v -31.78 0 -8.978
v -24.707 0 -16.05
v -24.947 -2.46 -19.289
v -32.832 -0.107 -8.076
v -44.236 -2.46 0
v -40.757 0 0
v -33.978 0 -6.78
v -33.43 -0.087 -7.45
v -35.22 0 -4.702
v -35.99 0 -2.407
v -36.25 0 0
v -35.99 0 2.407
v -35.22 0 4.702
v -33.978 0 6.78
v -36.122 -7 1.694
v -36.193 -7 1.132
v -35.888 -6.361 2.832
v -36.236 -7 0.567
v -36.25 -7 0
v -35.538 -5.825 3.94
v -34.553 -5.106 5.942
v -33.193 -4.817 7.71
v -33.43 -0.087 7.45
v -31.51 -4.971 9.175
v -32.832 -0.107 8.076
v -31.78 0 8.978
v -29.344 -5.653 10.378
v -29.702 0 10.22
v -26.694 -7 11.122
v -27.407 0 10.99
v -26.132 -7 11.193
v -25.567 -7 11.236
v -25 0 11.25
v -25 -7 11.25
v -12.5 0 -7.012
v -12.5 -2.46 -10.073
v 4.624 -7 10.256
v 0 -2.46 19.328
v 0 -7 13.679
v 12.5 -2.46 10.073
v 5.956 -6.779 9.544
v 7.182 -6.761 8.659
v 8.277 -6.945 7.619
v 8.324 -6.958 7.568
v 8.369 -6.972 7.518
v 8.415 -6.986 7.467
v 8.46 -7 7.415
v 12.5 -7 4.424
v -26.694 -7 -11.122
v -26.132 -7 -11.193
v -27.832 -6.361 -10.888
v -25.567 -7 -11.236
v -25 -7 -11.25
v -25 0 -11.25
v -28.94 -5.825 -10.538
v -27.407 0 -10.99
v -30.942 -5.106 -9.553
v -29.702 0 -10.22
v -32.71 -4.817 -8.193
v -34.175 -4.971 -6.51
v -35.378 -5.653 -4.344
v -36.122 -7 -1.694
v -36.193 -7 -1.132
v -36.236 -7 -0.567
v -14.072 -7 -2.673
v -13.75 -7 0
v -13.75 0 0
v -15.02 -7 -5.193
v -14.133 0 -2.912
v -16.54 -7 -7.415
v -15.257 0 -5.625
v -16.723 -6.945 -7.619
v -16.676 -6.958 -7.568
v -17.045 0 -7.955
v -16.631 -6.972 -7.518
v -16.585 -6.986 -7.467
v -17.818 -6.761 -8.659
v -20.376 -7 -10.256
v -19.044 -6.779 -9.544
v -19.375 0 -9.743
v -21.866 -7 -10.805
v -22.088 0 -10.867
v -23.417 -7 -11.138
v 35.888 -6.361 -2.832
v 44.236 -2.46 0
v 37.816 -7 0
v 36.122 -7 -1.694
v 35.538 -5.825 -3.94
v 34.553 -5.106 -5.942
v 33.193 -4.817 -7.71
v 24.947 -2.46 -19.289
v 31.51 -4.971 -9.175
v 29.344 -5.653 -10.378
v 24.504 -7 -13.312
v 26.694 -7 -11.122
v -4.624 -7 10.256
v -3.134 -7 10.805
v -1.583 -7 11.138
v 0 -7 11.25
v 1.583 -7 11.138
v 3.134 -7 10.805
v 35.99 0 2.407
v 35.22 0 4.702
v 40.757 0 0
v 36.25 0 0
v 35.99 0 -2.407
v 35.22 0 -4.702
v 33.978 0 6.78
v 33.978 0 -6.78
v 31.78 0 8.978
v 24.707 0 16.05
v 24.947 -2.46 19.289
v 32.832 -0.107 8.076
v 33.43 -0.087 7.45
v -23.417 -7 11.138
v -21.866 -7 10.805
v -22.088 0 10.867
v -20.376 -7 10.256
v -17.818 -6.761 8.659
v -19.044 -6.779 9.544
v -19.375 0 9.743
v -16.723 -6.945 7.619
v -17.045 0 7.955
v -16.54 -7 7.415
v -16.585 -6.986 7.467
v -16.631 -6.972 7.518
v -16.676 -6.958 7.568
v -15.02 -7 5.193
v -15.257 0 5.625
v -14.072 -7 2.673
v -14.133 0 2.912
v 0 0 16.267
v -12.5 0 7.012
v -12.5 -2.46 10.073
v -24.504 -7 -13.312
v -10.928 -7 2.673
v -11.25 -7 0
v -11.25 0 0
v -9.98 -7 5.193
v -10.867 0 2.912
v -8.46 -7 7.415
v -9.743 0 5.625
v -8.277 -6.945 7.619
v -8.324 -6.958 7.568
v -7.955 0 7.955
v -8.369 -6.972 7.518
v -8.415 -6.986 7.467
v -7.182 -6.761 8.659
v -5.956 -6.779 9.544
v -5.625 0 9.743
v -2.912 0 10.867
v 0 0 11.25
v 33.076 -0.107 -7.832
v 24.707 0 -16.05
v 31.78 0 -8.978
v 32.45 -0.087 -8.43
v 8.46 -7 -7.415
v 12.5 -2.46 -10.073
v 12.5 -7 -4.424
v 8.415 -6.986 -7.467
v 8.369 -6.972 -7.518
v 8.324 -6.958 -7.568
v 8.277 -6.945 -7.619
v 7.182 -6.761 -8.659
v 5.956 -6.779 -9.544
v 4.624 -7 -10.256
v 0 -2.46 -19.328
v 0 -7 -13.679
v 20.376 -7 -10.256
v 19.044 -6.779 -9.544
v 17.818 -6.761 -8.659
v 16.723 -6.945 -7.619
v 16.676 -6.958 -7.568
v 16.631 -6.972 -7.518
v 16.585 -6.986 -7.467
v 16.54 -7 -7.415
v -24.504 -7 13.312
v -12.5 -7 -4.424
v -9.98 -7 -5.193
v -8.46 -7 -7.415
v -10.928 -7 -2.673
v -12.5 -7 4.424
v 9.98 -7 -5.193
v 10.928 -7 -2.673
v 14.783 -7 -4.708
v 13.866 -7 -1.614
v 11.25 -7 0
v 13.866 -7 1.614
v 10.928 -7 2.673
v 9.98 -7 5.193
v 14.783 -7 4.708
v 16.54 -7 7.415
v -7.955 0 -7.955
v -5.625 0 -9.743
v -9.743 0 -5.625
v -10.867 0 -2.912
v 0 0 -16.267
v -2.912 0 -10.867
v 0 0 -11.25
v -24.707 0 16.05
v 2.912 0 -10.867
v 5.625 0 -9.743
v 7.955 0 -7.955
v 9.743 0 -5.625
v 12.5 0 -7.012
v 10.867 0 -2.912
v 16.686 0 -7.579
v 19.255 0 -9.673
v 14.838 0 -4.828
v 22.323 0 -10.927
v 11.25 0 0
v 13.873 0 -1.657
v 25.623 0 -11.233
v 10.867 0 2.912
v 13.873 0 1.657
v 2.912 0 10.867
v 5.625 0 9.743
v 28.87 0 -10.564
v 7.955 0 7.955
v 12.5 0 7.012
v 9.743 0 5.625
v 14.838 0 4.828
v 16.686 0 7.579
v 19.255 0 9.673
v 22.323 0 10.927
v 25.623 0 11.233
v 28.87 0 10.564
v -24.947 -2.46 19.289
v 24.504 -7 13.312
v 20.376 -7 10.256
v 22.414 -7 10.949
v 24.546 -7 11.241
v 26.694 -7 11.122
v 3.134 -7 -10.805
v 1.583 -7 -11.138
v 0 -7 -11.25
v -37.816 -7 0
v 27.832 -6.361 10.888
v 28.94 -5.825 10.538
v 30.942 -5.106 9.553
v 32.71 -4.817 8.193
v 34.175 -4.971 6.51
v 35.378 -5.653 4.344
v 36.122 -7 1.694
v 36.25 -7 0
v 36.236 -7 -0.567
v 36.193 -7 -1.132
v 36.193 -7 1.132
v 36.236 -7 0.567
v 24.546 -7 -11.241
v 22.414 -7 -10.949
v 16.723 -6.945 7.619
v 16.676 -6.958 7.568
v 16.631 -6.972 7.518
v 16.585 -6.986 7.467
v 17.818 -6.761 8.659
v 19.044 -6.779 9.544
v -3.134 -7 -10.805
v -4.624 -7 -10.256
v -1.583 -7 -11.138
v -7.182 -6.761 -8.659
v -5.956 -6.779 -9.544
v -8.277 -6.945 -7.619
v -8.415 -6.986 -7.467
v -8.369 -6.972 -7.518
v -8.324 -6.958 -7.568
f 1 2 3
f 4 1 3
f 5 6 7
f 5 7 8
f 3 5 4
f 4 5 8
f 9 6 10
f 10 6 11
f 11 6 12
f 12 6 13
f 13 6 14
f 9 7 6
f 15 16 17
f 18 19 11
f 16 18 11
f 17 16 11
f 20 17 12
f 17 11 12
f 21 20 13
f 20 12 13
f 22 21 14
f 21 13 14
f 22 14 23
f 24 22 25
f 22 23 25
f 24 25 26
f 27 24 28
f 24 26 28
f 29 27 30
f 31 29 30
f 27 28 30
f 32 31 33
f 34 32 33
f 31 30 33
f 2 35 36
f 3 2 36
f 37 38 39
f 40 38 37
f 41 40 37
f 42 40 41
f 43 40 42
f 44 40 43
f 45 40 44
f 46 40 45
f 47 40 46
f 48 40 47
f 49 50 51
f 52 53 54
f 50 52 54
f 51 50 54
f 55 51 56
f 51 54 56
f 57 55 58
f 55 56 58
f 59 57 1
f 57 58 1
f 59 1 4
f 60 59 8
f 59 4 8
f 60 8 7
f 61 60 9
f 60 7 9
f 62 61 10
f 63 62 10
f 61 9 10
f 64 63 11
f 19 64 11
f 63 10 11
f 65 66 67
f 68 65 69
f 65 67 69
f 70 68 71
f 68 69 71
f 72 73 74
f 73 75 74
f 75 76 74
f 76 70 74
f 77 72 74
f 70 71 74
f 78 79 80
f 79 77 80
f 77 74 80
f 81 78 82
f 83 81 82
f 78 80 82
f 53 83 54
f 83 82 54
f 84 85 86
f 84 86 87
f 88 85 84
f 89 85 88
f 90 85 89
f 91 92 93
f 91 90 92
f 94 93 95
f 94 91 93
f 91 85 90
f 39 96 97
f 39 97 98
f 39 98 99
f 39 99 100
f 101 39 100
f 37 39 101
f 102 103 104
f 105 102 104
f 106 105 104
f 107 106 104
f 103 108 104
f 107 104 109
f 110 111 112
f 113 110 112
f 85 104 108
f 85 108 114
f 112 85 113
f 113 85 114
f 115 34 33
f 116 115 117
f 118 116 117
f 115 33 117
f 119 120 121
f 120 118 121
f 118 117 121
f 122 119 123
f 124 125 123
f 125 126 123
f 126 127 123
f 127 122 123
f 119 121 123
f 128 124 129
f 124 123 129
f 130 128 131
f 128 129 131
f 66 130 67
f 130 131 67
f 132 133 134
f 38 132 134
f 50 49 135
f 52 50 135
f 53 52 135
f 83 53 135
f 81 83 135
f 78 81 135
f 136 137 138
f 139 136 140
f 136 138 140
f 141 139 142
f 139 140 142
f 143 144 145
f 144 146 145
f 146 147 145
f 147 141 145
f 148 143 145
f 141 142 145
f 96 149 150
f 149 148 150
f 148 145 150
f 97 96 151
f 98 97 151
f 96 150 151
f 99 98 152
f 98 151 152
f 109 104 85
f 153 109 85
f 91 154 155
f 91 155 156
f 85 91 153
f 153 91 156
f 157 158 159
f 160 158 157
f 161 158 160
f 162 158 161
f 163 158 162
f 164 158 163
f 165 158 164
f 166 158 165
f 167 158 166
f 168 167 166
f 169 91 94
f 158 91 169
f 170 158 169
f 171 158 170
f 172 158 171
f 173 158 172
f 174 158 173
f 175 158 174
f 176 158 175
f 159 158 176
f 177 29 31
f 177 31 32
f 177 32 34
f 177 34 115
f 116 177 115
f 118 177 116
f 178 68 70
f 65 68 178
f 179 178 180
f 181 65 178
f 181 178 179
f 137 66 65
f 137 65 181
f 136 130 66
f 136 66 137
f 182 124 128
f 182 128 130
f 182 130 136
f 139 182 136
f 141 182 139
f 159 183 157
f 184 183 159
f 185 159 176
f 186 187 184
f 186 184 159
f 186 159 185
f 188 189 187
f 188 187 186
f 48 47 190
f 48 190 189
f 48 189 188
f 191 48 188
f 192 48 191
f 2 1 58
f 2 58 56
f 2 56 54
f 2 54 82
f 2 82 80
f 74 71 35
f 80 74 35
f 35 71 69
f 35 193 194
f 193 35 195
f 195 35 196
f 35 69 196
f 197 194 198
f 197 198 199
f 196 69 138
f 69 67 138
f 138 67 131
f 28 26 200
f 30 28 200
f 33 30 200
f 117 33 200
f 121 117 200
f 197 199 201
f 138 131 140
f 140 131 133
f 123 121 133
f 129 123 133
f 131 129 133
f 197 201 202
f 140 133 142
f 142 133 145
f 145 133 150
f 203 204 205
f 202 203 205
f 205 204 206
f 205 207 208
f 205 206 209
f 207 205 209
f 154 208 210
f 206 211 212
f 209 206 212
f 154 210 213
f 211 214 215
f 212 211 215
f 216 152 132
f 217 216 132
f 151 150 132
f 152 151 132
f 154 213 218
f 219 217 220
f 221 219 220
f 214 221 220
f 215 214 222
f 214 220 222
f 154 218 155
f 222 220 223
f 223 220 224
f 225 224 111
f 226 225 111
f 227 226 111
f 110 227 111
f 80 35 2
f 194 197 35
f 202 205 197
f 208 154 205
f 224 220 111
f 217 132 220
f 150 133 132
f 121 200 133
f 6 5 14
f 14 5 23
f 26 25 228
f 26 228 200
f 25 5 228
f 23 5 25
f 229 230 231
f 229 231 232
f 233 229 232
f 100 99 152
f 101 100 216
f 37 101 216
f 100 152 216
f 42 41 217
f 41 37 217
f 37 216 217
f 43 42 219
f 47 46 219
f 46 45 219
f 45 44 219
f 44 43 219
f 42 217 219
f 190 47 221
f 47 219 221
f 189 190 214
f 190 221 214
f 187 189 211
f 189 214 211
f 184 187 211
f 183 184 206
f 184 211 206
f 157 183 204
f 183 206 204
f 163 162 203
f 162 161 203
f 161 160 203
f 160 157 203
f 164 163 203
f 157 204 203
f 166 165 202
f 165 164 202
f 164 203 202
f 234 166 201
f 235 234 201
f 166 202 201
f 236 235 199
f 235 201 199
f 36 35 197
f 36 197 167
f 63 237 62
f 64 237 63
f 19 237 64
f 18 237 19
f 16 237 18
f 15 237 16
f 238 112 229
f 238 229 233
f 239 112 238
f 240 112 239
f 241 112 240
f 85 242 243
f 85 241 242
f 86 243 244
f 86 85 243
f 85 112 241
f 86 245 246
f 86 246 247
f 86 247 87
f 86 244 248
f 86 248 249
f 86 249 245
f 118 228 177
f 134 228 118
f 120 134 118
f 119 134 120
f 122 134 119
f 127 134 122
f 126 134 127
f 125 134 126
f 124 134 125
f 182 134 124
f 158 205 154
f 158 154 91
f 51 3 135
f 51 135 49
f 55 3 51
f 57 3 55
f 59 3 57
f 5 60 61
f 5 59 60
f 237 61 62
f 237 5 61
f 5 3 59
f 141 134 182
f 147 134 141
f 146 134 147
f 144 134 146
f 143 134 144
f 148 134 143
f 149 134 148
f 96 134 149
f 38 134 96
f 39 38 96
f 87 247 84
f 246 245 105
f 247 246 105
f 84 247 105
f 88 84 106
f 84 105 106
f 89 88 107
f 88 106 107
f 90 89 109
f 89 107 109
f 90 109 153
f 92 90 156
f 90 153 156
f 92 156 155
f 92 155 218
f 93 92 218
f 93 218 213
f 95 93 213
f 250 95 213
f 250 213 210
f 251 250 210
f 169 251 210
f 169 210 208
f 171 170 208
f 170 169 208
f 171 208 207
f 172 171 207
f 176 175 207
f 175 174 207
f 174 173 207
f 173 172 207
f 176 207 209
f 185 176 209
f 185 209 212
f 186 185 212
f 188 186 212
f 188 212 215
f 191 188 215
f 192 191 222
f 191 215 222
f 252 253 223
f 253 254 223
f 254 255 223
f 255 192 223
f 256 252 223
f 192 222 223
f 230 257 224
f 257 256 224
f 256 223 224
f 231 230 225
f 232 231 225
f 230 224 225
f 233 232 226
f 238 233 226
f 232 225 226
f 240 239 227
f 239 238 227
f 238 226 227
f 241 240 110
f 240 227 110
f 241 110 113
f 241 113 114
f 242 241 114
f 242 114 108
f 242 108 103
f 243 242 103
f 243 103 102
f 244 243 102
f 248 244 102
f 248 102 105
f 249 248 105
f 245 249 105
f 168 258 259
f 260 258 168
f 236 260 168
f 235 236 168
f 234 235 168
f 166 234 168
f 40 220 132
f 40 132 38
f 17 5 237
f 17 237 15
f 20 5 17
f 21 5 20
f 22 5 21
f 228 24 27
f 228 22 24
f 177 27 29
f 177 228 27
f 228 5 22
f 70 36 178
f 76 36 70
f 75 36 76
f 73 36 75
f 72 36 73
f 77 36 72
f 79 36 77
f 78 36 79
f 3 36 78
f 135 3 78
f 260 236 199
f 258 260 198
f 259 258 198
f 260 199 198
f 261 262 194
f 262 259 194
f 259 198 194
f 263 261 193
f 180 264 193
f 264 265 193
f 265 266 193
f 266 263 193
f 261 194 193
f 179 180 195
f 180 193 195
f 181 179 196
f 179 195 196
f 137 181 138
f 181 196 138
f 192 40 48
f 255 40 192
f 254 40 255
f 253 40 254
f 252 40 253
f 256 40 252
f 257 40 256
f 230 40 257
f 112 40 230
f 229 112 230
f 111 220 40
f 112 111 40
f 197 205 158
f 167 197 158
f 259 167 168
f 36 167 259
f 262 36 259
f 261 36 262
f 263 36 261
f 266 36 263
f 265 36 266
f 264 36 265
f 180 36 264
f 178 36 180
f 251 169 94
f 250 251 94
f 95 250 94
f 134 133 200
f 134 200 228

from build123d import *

# Parameters (mm, degrees)
F1_DEPTH      = 7
F2_T1_DEPTH   = 54.4125704052
F2_T3_DEPTH   = 54.4125704052
F2_T5_DEPTH   = 54.4125704052
F2_T7_DEPTH   = 54.4125704052
F2_T12_DEPTH  = 41.6814695772
F2_T17_DEPTH  = 41.6814695772
F2_T22_DEPTH  = 41.6814695772
F2_T27_DEPTH  = 41.6814695772
F2_T32_DEPTH  = 41.6814695772
F2_T37_DEPTH  = 41.6814695772
F2_T42_DEPTH  = 41.6814695772
F2_T47_DEPTH  = 41.6814695772
F2_T53_DEPTH  = 41.6814695772
F2_S55_R      = 11.25
F2_T56_DEPTH  = 25
F2_T59_DEPTH  = 41.6814695772
F2_S61_R      = 11.25
F2_T62_DEPTH  = 25
F2_T68_DEPTH  = 41.6814695772
F2_S70_R      = 11.25
F2_T71_DEPTH  = 25
F2_T74_DEPTH  = 41.6814695772
F2_S76_R      = 11.25
F2_T77_DEPTH  = 25
F2_T83_DEPTH  = 41.6814695772
F2_S85_R      = 11.25
F2_T86_DEPTH  = 25
F2_T89_DEPTH  = 41.6814695772
F2_S91_R      = 11.25
F2_T92_DEPTH  = 25
F2_T98_DEPTH  = 41.6814695772
F2_S100_R     = 11.25
F2_T101_DEPTH = 25
F2_T104_DEPTH = 41.6814695772
F2_S106_R     = 11.25
F2_T107_DEPTH = 25
F3_T1_DEPTH   = 43.7143691753
F3_T3_DEPTH   = 43.7143691753
F3_T5_DEPTH   = 43.7143691753
F3_T7_DEPTH   = 43.7143691753
F3_T12_DEPTH  = 30.9832683473
F3_T17_DEPTH  = 30.9832683473
F3_T22_DEPTH  = 30.9832683473
F3_T27_DEPTH  = 30.9832683473
F3_T32_DEPTH  = 30.9832683473
F3_T37_DEPTH  = 30.9832683473
F3_T42_DEPTH  = 30.9832683473
F3_T47_DEPTH  = 30.9832683473
F3_T53_DEPTH  = 30.9832683473
F3_T57_DEPTH  = 30.9832683473
F3_T64_DEPTH  = 30.9832683473
F3_T68_DEPTH  = 30.9832683473
F3_T75_DEPTH  = 30.9832683473
F3_T79_DEPTH  = 30.9832683473
F3_T86_DEPTH  = 30.9832683473
F3_T90_DEPTH  = 30.9832683473


# Not quite as in the source:
# - a fillet or chamfer that OpenCascade refuses, or shapes differently, is made with other operations: its cross-section is extruded or revolved along the edge and cut away or added


with BuildPart() as f1:
    # F0 (on Front) → F1 (new body)
    with BuildSketch(Plane.XZ):
        with BuildLine():
            Line((-25, 11.25), (-25, 20))
            Line((-25, 20), (-45, 0))
            Line((-45, 0), (-36.25, 0))
            ThreePointArc((-36.25, 0), (-32.9549512883, 7.9549512883), (-25, 11.25))
        make_face()
        with BuildLine():
            Line((-13.75, 0), (-12.5, 0))
            Line((-12.5, 0), (-12.5, 10.7452115044))
            Line((-12.5, 10.7452115044), (-25, 20))
            Line((-25, 20), (-25, 11.25))
            ThreePointArc((-25, 11.25), (-17.0450487117, 7.9549512883), (-13.75, 0))
        make_face()
        with BuildLine():
            Line((-12.5, -10.7452115044), (-12.5, 0))
            Line((-12.5, 0), (-13.75, 0))
            ThreePointArc((-13.75, 0), (-17.0450487117, -7.9549512883), (-25, -11.25))
            Line((-25, -11.25), (-25, -20))
            Line((-25, -20), (-12.5, -10.7452115044))
        make_face()
        with BuildLine():
            Line((-45, 0), (-25, -20))
            Line((-25, -20), (-25, -11.25))
            ThreePointArc((-25, -11.25), (-32.9549512883, -7.9549512883), (-36.25, 0))
            Line((-36.25, 0), (-45, 0))
        make_face()
        with BuildLine():
            Line((0, -20), (0, -11.25))
            ThreePointArc((0, -11.25), (-7.9549512883, -7.9549512883), (-11.25, 0))
            Line((-11.25, 0), (-12.5, 0))
            Line((-12.5, 0), (-12.5, -10.7452115044))
            Line((-12.5, -10.7452115044), (0, -20))
        make_face()
        with BuildLine():
            Line((12.5, 0), (11.25, 0))
            ThreePointArc((11.25, 0), (7.9549512883, -7.9549512883), (0, -11.25))
            Line((0, -11.25), (0, -20))
            Line((0, -20), (12.5, -10.7452115044))
            Line((12.5, -10.7452115044), (12.5, 0))
        make_face()
        with BuildLine():
            ThreePointArc((0, 11.25), (7.9549512883, 7.9549512883), (11.25, 0))
            Line((11.25, 0), (12.5, 0))
            Line((12.5, 0), (12.5, 10.7452115044))
            Line((12.5, 10.7452115044), (0, 20))
            Line((0, 20), (0, 11.25))
        make_face()
        with BuildLine():
            ThreePointArc((-11.25, 0), (-7.9549512883, 7.9549512883), (0, 11.25))
            Line((0, 11.25), (0, 20))
            Line((0, 20), (-12.5, 10.7452115044))
            Line((-12.5, 10.7452115044), (-12.5, 0))
            Line((-12.5, 0), (-11.25, 0))
        make_face()
        with BuildLine():
            Line((12.5, 10.7452115044), (12.5, 0))
            Line((12.5, 0), (13.75, 0))
            ThreePointArc((13.75, 0), (25, 11.25), (36.25, 0))
            Line((36.25, 0), (45, 0))
            Line((45, 0), (25, 20))
            Line((25, 20), (12.5, 10.7452115044))
        make_face()
        with BuildLine():
            Line((13.75, 0), (12.5, 0))
            Line((12.5, 0), (12.5, -10.7452115044))
            Line((12.5, -10.7452115044), (25, -20))
            Line((25, -20), (45, 0))
            Line((45, 0), (36.25, 0))
            ThreePointArc((36.25, 0), (25, -11.25), (13.75, 0))
        make_face()
    extrude(amount=F1_DEPTH)

    # F2: chamfer of 5.08 on 12 edges, made by hand

    # F2_s2 → F2_t1 (cut)
    with BuildSketch(Plane(origin=(6.7377487577, 0, 6.7377487577), x_dir=(0, 1, 0), z_dir=(-0.7071067812, 0, -0.7071067812))):
        Polygon((-1.92, -31.8198051534), (-7, -26.7398051534), (-7, -31.8198051534), align=None)
    extrude(amount=F2_T1_DEPTH, mode=Mode.SUBTRACT)

    # F2_s4 → F2_t3 (cut)
    with BuildSketch(Plane(origin=(31.7377487577, 0, -31.7377487577), x_dir=(0, 1, 0), z_dir=(-0.7071067812, 0, 0.7071067812))):
        Polygon((-1.92, -31.8198051534), (-7, -26.7398051534), (-7, -31.8198051534), align=None)
    extrude(amount=F2_T3_DEPTH, mode=Mode.SUBTRACT)

    # F2_s6 → F2_t5 (cut)
    with BuildSketch(Plane(origin=(-6.7377487577, 0, -6.7377487577), x_dir=(0, 1, 0), z_dir=(0.7071067812, 0, 0.7071067812))):
        Polygon((-1.92, -31.8198051534), (-7, -26.7398051534), (-7, -31.8198051534), align=None)
    extrude(amount=F2_T5_DEPTH, mode=Mode.SUBTRACT)

    # F2_s8 → F2_t7 (cut)
    with BuildSketch(Plane(origin=(-31.7377487577, 0, 31.7377487577), x_dir=(0, 1, 0), z_dir=(0.7071067812, 0, -0.7071067812))):
        Polygon((-1.92, -31.8198051534), (-7, -26.7398051534), (-7, -31.8198051534), align=None)
    extrude(amount=F2_T7_DEPTH, mode=Mode.SUBTRACT)


with BuildPart() as f2_tool10:
    # F2_s11 → F2_t12 (new body)
    with BuildSketch(Plane(origin=(-2.7131807604, 0, 2.008793127), x_dir=(0, 1, 0), z_dir=(-0.8036946592, 0, 0.5950419269))):
        Polygon((-1.92, -1.1978450121), (-7, 3.8821549879), (-7, -1.1978450121), align=None)
    extrude(amount=F2_T12_DEPTH)

    split(bisect_by=Plane(origin=(-9.5646403729, 0, 12.918502105), x_dir=(0, 1, 0), z_dir=(-0.5950419269, 0, 0.8036946592)), keep=Keep.TOP)


with BuildPart() as f1_1:
    add(f1.part)

    # F2_t9: cut F2_tool10
    add(f2_tool10.part, mode=Mode.SUBTRACT)


with BuildPart() as f2_tool15:
    # F2_s16 → F2_t17 (new body)
    with BuildSketch(Plane(origin=(20.0642276166, 0, 14.8552146336), x_dir=(0, 1, 0), z_dir=(-0.8036946592, 0, -0.5950419269))):
        Polygon((-1.92, -16.0738931843), (-7, -10.9938931843), (-7, -16.0738931843), align=None)
    extrude(amount=F2_T17_DEPTH)

    split(bisect_by=Plane(origin=(0.7127680041, 0, 0.9627016388), x_dir=(0, 1, 0), z_dir=(0.5950419269, 0, 0.8036946592)), keep=Keep.TOP)


with BuildPart() as f1_2:
    add(f1_1.part)

    # F2_t14: cut F2_tool15
    add(f2_tool15.part, mode=Mode.SUBTRACT)


with BuildPart() as f2_tool20:
    # F2_s21 → F2_t22 (new body)
    with BuildSketch(Plane(origin=(13.4349468708, 0, -9.9470073391), x_dir=(0, 1, 0), z_dir=(-0.8036946592, 0, 0.5950419269))):
        Polygon((-1.92, -16.0738931843), (-7, -10.9938931843), (-7, -16.0738931843), align=None)
    extrude(amount=F2_T22_DEPTH)

    split(bisect_by=Plane(origin=(-0.7127680041, 0, 0.9627016388), x_dir=(0, 1, 0), z_dir=(-0.5950419269, 0, 0.8036946592)), keep=Keep.TOP)


with BuildPart() as f1_3:
    add(f1_2.part)

    # F2_t19: cut F2_tool20
    add(f2_tool20.part, mode=Mode.SUBTRACT)


with BuildPart() as f2_tool25:
    # F2_s26 → F2_t27 (new body)
    with BuildSketch(Plane(origin=(36.2123552478, 0, 26.8110150997), x_dir=(0, 1, 0), z_dir=(-0.8036946592, 0, -0.5950419269))):
        Polygon((-1.92, -1.1978450121), (-7, 3.8821549879), (-7, -1.1978450121), align=None)
    extrude(amount=F2_T27_DEPTH)

    split(bisect_by=Plane(origin=(9.5646403729, 0, 12.918502105), x_dir=(0, 1, 0), z_dir=(0.5950419269, 0, 0.8036946592)), keep=Keep.TOP)


with BuildPart() as f1_4:
    add(f1_3.part)

    # F2_t24: cut F2_tool25
    add(f2_tool25.part, mode=Mode.SUBTRACT)


with BuildPart() as f2_tool30:
    # F2_s31 → F2_t32 (new body)
    with BuildSketch(Plane(origin=(2.7131807604, 0, -2.008793127), x_dir=(0, 1, 0), z_dir=(0.8036946592, 0, -0.5950419269))):
        Polygon((-1.92, -1.1978450121), (-7, 3.8821549879), (-7, -1.1978450121), align=None)
    extrude(amount=F2_T32_DEPTH)

    split(bisect_by=Plane(origin=(9.5646403729, 0, -12.918502105), x_dir=(0, 1, 0), z_dir=(0.5950419269, 0, -0.8036946592)), keep=Keep.TOP)


with BuildPart() as f1_5:
    add(f1_4.part)

    # F2_t29: cut F2_tool30
    add(f2_tool30.part, mode=Mode.SUBTRACT)


with BuildPart() as f2_tool35:
    # F2_s36 → F2_t37 (new body)
    with BuildSketch(Plane(origin=(-20.0642276166, 0, -14.8552146336), x_dir=(0, 1, 0), z_dir=(0.8036946592, 0, 0.5950419269))):
        Polygon((-1.92, -16.0738931843), (-7, -10.9938931843), (-7, -16.0738931843), align=None)
    extrude(amount=F2_T37_DEPTH)

    split(bisect_by=Plane(origin=(-0.7127680041, 0, -0.9627016388), x_dir=(0, 1, 0), z_dir=(-0.5950419269, 0, -0.8036946592)), keep=Keep.TOP)


with BuildPart() as f1_6:
    add(f1_5.part)

    # F2_t34: cut F2_tool35
    add(f2_tool35.part, mode=Mode.SUBTRACT)


with BuildPart() as f2_tool40:
    # F2_s41 → F2_t42 (new body)
    with BuildSketch(Plane(origin=(-13.4349468708, 0, 9.9470073391), x_dir=(0, 1, 0), z_dir=(0.8036946592, 0, -0.5950419269))):
        Polygon((-1.92, -16.0738931843), (-7, -10.9938931843), (-7, -16.0738931843), align=None)
    extrude(amount=F2_T42_DEPTH)

    split(bisect_by=Plane(origin=(0.7127680041, 0, -0.9627016388), x_dir=(0, 1, 0), z_dir=(0.5950419269, 0, -0.8036946592)), keep=Keep.TOP)


with BuildPart() as f1_7:
    add(f1_6.part)

    # F2_t39: cut F2_tool40
    add(f2_tool40.part, mode=Mode.SUBTRACT)


with BuildPart() as f2_tool45:
    # F2_s46 → F2_t47 (new body)
    with BuildSketch(Plane(origin=(-36.2123552478, 0, -26.8110150997), x_dir=(0, 1, 0), z_dir=(0.8036946592, 0, 0.5950419269))):
        Polygon((-1.92, -1.1978450121), (-7, 3.8821549879), (-7, -1.1978450121), align=None)
    extrude(amount=F2_T47_DEPTH)

    split(bisect_by=Plane(origin=(-9.5646403729, 0, -12.918502105), x_dir=(0, 1, 0), z_dir=(-0.5950419269, 0, -0.8036946592)), keep=Keep.TOP)


with BuildPart() as f1_8:
    add(f1_7.part)

    # F2_t44: cut F2_tool45
    add(f2_tool45.part, mode=Mode.SUBTRACT)


with BuildPart() as f2_tool51:
    # F2_s52 → F2_t53 (new body)
    with BuildSketch(Plane(origin=(20.0642276166, 0, 14.8552146336), x_dir=(0, 1, 0), z_dir=(-0.8036946592, 0, -0.5950419269))):
        Polygon((-1.92, -16.0738931843), (-7, -10.9938931843), (-7, -16.0738931843), align=None)
    extrude(amount=F2_T53_DEPTH)

    split(bisect_by=Plane(origin=(0.7127680041, 0, 0.9627016388), x_dir=(0, 1, 0), z_dir=(-0.5950419269, 0, -0.8036946592)), keep=Keep.TOP)

    # F2_s55 → F2_t56 (cut, symmetric)
    with BuildSketch(Plane.XZ.offset(4.5)):
        with Locations((-25, 0)):
            Circle(F2_S55_R)
    extrude(amount=F2_T56_DEPTH, both=True, mode=Mode.SUBTRACT)


with BuildPart() as f2_tool57:
    # F2_s58 → F2_t59 (new body)
    with BuildSketch(Plane(origin=(-2.7131807604, 0, 2.008793127), x_dir=(0, 1, 0), z_dir=(-0.8036946592, 0, 0.5950419269))):
        Polygon((-1.92, -1.1978450121), (-7, 3.8821549879), (-7, -1.1978450121), align=None)
    extrude(amount=F2_T59_DEPTH)

    split(bisect_by=Plane(origin=(-9.5646403729, 0, 12.918502105), x_dir=(0, 1, 0), z_dir=(0.5950419269, 0, -0.8036946592)), keep=Keep.TOP)

    # F2_s61 → F2_t62 (cut, symmetric)
    with BuildSketch(Plane.XZ.offset(4.5)):
        Circle(F2_S61_R)
    extrude(amount=F2_T62_DEPTH, both=True, mode=Mode.SUBTRACT)


with BuildPart() as f2_tool51_1:
    add(f2_tool51.part)

    # F2_t63: intersect F2_tool57
    add(f2_tool57.part, mode=Mode.INTERSECT)


with BuildPart() as f1_9:
    add(f1_8.part)

    # F2_t49: cut F2_tool51
    add(f2_tool51_1.part, mode=Mode.SUBTRACT)


with BuildPart() as f2_tool66:
    # F2_s67 → F2_t68 (new body)
    with BuildSketch(Plane(origin=(36.2123552478, 0, 26.8110150997), x_dir=(0, 1, 0), z_dir=(-0.8036946592, 0, -0.5950419269))):
        Polygon((-1.92, -1.1978450121), (-7, 3.8821549879), (-7, -1.1978450121), align=None)
    extrude(amount=F2_T68_DEPTH)

    split(bisect_by=Plane(origin=(9.5646403729, 0, 12.918502105), x_dir=(0, 1, 0), z_dir=(-0.5950419269, 0, -0.8036946592)), keep=Keep.TOP)

    # F2_s70 → F2_t71 (cut, symmetric)
    with BuildSketch(Plane.XZ.offset(4.5)):
        Circle(F2_S70_R)
    extrude(amount=F2_T71_DEPTH, both=True, mode=Mode.SUBTRACT)


with BuildPart() as f2_tool72:
    # F2_s73 → F2_t74 (new body)
    with BuildSketch(Plane(origin=(13.4349468708, 0, -9.9470073391), x_dir=(0, 1, 0), z_dir=(-0.8036946592, 0, 0.5950419269))):
        Polygon((-1.92, -16.0738931843), (-7, -10.9938931843), (-7, -16.0738931843), align=None)
    extrude(amount=F2_T74_DEPTH)

    split(bisect_by=Plane(origin=(-0.7127680041, 0, 0.9627016388), x_dir=(0, 1, 0), z_dir=(0.5950419269, 0, -0.8036946592)), keep=Keep.TOP)

    # F2_s76 → F2_t77 (cut, symmetric)
    with BuildSketch(Plane.XZ.offset(4.5)):
        with Locations((25, 0)):
            Circle(F2_S76_R)
    extrude(amount=F2_T77_DEPTH, both=True, mode=Mode.SUBTRACT)


with BuildPart() as f2_tool66_1:
    add(f2_tool66.part)

    # F2_t78: intersect F2_tool72
    add(f2_tool72.part, mode=Mode.INTERSECT)


with BuildPart() as f1_10:
    add(f1_9.part)

    # F2_t64: cut F2_tool66
    add(f2_tool66_1.part, mode=Mode.SUBTRACT)


with BuildPart() as f2_tool81:
    # F2_s82 → F2_t83 (new body)
    with BuildSketch(Plane(origin=(-20.0642276166, 0, -14.8552146336), x_dir=(0, 1, 0), z_dir=(0.8036946592, 0, 0.5950419269))):
        Polygon((-1.92, -16.0738931843), (-7, -10.9938931843), (-7, -16.0738931843), align=None)
    extrude(amount=F2_T83_DEPTH)

    split(bisect_by=Plane(origin=(-0.7127680041, 0, -0.9627016388), x_dir=(0, 1, 0), z_dir=(0.5950419269, 0, 0.8036946592)), keep=Keep.TOP)

    # F2_s85 → F2_t86 (cut, symmetric)
    with BuildSketch(Plane.XZ.offset(4.5)):
        with Locations((25, 0)):
            Circle(F2_S85_R)
    extrude(amount=F2_T86_DEPTH, both=True, mode=Mode.SUBTRACT)


with BuildPart() as f2_tool87:
    # F2_s88 → F2_t89 (new body)
    with BuildSketch(Plane(origin=(2.7131807604, 0, -2.008793127), x_dir=(0, 1, 0), z_dir=(0.8036946592, 0, -0.5950419269))):
        Polygon((-1.92, -1.1978450121), (-7, 3.8821549879), (-7, -1.1978450121), align=None)
    extrude(amount=F2_T89_DEPTH)

    split(bisect_by=Plane(origin=(9.5646403729, 0, -12.918502105), x_dir=(0, 1, 0), z_dir=(-0.5950419269, 0, 0.8036946592)), keep=Keep.TOP)

    # F2_s91 → F2_t92 (cut, symmetric)
    with BuildSketch(Plane.XZ.offset(4.5)):
        Circle(F2_S91_R)
    extrude(amount=F2_T92_DEPTH, both=True, mode=Mode.SUBTRACT)


with BuildPart() as f2_tool81_1:
    add(f2_tool81.part)

    # F2_t93: intersect F2_tool87
    add(f2_tool87.part, mode=Mode.INTERSECT)


with BuildPart() as f1_11:
    add(f1_10.part)

    # F2_t79: cut F2_tool81
    add(f2_tool81_1.part, mode=Mode.SUBTRACT)


with BuildPart() as f2_tool96:
    # F2_s97 → F2_t98 (new body)
    with BuildSketch(Plane(origin=(-36.2123552478, 0, -26.8110150997), x_dir=(0, 1, 0), z_dir=(0.8036946592, 0, 0.5950419269))):
        Polygon((-1.92, -1.1978450121), (-7, 3.8821549879), (-7, -1.1978450121), align=None)
    extrude(amount=F2_T98_DEPTH)

    split(bisect_by=Plane(origin=(-9.5646403729, 0, -12.918502105), x_dir=(0, 1, 0), z_dir=(0.5950419269, 0, 0.8036946592)), keep=Keep.TOP)

    # F2_s100 → F2_t101 (cut, symmetric)
    with BuildSketch(Plane.XZ.offset(4.5)):
        Circle(F2_S100_R)
    extrude(amount=F2_T101_DEPTH, both=True, mode=Mode.SUBTRACT)


with BuildPart() as f2_tool102:
    # F2_s103 → F2_t104 (new body)
    with BuildSketch(Plane(origin=(-13.4349468708, 0, 9.9470073391), x_dir=(0, 1, 0), z_dir=(0.8036946592, 0, -0.5950419269))):
        Polygon((-1.92, -16.0738931843), (-7, -10.9938931843), (-7, -16.0738931843), align=None)
    extrude(amount=F2_T104_DEPTH)

    split(bisect_by=Plane(origin=(0.7127680041, 0, -0.9627016388), x_dir=(0, 1, 0), z_dir=(-0.5950419269, 0, 0.8036946592)), keep=Keep.TOP)

    # F2_s106 → F2_t107 (cut, symmetric)
    with BuildSketch(Plane.XZ.offset(4.5)):
        with Locations((-25, 0)):
            Circle(F2_S106_R)
    extrude(amount=F2_T107_DEPTH, both=True, mode=Mode.SUBTRACT)


with BuildPart() as f2_tool96_1:
    add(f2_tool96.part)

    # F2_t108: intersect F2_tool102
    add(f2_tool102.part, mode=Mode.INTERSECT)


with BuildPart() as f1_12:
    add(f1_11.part)

    # F2_t94: cut F2_tool96
    add(f2_tool96_1.part, mode=Mode.SUBTRACT)

    # F3: chamfer of 3 on 12 edges, made by hand

    # F3_s2 → F3_t1 (cut)
    with BuildSketch(Plane(origin=(-2.9553634396, 0, -2.9553634396), x_dir=(0, 1, 0), z_dir=(0.7071067812, 0, 0.7071067812))):
        Polygon((0, -28.8198051534), (-3, -31.8198051534), (0, -31.8198051534), align=None)
    extrude(amount=F3_T1_DEPTH, mode=Mode.SUBTRACT)

    # F3_s4 → F3_t3 (cut)
    with BuildSketch(Plane(origin=(-27.9553634396, 0, 27.9553634396), x_dir=(0, 1, 0), z_dir=(0.7071067812, 0, -0.7071067812))):
        Polygon((0, -28.8198051534), (-3, -31.8198051534), (0, -31.8198051534), align=None)
    extrude(amount=F3_T3_DEPTH, mode=Mode.SUBTRACT)

    # F3_s6 → F3_t5 (cut)
    with BuildSketch(Plane(origin=(2.9553634396, 0, 2.9553634396), x_dir=(0, 1, 0), z_dir=(-0.7071067812, 0, -0.7071067812))):
        Polygon((-3, -31.8198051534), (0, -28.8198051534), (0, -31.8198051534), align=None)
    extrude(amount=F3_T5_DEPTH, mode=Mode.SUBTRACT)

    # F3_s8 → F3_t7 (cut)
    with BuildSketch(Plane(origin=(27.9553634396, 0, -27.9553634396), x_dir=(0, 1, 0), z_dir=(-0.7071067812, 0, 0.7071067812))):
        Polygon((0, -28.8198051534), (-3, -31.8198051534), (0, -31.8198051534), align=None)
    extrude(amount=F3_T7_DEPTH, mode=Mode.SUBTRACT)


with BuildPart() as f3_tool10:
    # F3_s11 → F3_t12 (new body)
    with BuildSketch(Plane(origin=(7.0122243563, 0, -5.1917322641), x_dir=(0, 1, 0), z_dir=(0.8036946592, 0, -0.5950419269))):
        Polygon((0, 1.8021549879), (-3, -1.1978450121), (0, -1.1978450121), align=None)
    extrude(amount=F3_T12_DEPTH)

    split(bisect_by=Plane(origin=(9.5646403729, 0, -12.918502105), x_dir=(0, 1, 0), z_dir=(0.5950419269, 0, -0.8036946592)), keep=Keep.TOP)


with BuildPart() as f1_13:
    add(f1_12.part)

    # F3_t9: cut F3_tool10
    add(f3_tool10.part, mode=Mode.SUBTRACT)


with BuildPart() as f3_tool15:
    # F3_s16 → F3_t17 (new body)
    with BuildSketch(Plane(origin=(-15.7651840208, 0, -11.6722754965), x_dir=(0, 1, 0), z_dir=(0.8036946592, 0, 0.5950419269))):
        Polygon((0, -13.0738931843), (-3, -16.0738931843), (0, -16.0738931843), align=None)
    extrude(amount=F3_T17_DEPTH)

    split(bisect_by=Plane(origin=(-0.7127680041, 0, -0.9627016388), x_dir=(0, 1, 0), z_dir=(-0.5950419269, 0, -0.8036946592)), keep=Keep.TOP)


with BuildPart() as f1_14:
    add(f1_13.part)

    # F3_t14: cut F3_tool15
    add(f3_tool15.part, mode=Mode.SUBTRACT)


with BuildPart() as f3_tool20:
    # F3_s21 → F3_t22 (new body)
    with BuildSketch(Plane(origin=(-9.1359032749, 0, 6.7640682021), x_dir=(0, 1, 0), z_dir=(0.8036946592, 0, -0.5950419269))):
        Polygon((0, -13.0738931843), (-3, -16.0738931843), (0, -16.0738931843), align=None)
    extrude(amount=F3_T22_DEPTH)

    split(bisect_by=Plane(origin=(0.7127680041, 0, -0.9627016388), x_dir=(0, 1, 0), z_dir=(0.5950419269, 0, -0.8036946592)), keep=Keep.TOP)


with BuildPart() as f1_15:
    add(f1_14.part)

    # F3_t19: cut F3_tool20
    add(f3_tool20.part, mode=Mode.SUBTRACT)


with BuildPart() as f3_tool25:
    # F3_s26 → F3_t27 (new body)
    with BuildSketch(Plane(origin=(-31.913311652, 0, -23.6280759627), x_dir=(0, 1, 0), z_dir=(0.8036946592, 0, 0.5950419269))):
        Polygon((0, 1.8021549879), (-3, -1.1978450121), (0, -1.1978450121), align=None)
    extrude(amount=F3_T27_DEPTH)

    split(bisect_by=Plane(origin=(-9.5646403729, 0, -12.918502105), x_dir=(0, 1, 0), z_dir=(-0.5950419269, 0, -0.8036946592)), keep=Keep.TOP)


with BuildPart() as f1_16:
    add(f1_15.part)

    # F3_t24: cut F3_tool25
    add(f3_tool25.part, mode=Mode.SUBTRACT)


with BuildPart() as f3_tool30:
    # F3_s31 → F3_t32 (new body)
    with BuildSketch(Plane(origin=(-7.0122243563, 0, 5.1917322641), x_dir=(0, 1, 0), z_dir=(-0.8036946592, 0, 0.5950419269))):
        Polygon((0, 1.8021549879), (-3, -1.1978450121), (0, -1.1978450121), align=None)
    extrude(amount=F3_T32_DEPTH)

    split(bisect_by=Plane(origin=(-9.5646403729, 0, 12.918502105), x_dir=(0, 1, 0), z_dir=(-0.5950419269, 0, 0.8036946592)), keep=Keep.TOP)


with BuildPart() as f1_17:
    add(f1_16.part)

    # F3_t29: cut F3_tool30
    add(f3_tool30.part, mode=Mode.SUBTRACT)


with BuildPart() as f3_tool35:
    # F3_s36 → F3_t37 (new body)
    with BuildSketch(Plane(origin=(15.7651840208, 0, 11.6722754965), x_dir=(0, 1, 0), z_dir=(-0.8036946592, 0, -0.5950419269))):
        Polygon((0, -13.0738931843), (-3, -16.0738931843), (0, -16.0738931843), align=None)
    extrude(amount=F3_T37_DEPTH)

    split(bisect_by=Plane(origin=(0.7127680041, 0, 0.9627016388), x_dir=(0, 1, 0), z_dir=(0.5950419269, 0, 0.8036946592)), keep=Keep.TOP)


with BuildPart() as f1_18:
    add(f1_17.part)

    # F3_t34: cut F3_tool35
    add(f3_tool35.part, mode=Mode.SUBTRACT)


with BuildPart() as f3_tool40:
    # F3_s41 → F3_t42 (new body)
    with BuildSketch(Plane(origin=(9.1359032749, 0, -6.7640682021), x_dir=(0, 1, 0), z_dir=(-0.8036946592, 0, 0.5950419269))):
        Polygon((0, -13.0738931843), (-3, -16.0738931843), (0, -16.0738931843), align=None)
    extrude(amount=F3_T42_DEPTH)

    split(bisect_by=Plane(origin=(-0.7127680041, 0, 0.9627016388), x_dir=(0, 1, 0), z_dir=(-0.5950419269, 0, 0.8036946592)), keep=Keep.TOP)


with BuildPart() as f1_19:
    add(f1_18.part)

    # F3_t39: cut F3_tool40
    add(f3_tool40.part, mode=Mode.SUBTRACT)


with BuildPart() as f3_tool45:
    # F3_s46 → F3_t47 (new body)
    with BuildSketch(Plane(origin=(31.913311652, 0, 23.6280759627), x_dir=(0, 1, 0), z_dir=(-0.8036946592, 0, -0.5950419269))):
        Polygon((0, 1.8021549879), (-3, -1.1978450121), (0, -1.1978450121), align=None)
    extrude(amount=F3_T47_DEPTH)

    split(bisect_by=Plane(origin=(9.5646403729, 0, 12.918502105), x_dir=(0, 1, 0), z_dir=(0.5950419269, 0, 0.8036946592)), keep=Keep.TOP)


with BuildPart() as f1_20:
    add(f1_19.part)

    # F3_t44: cut F3_tool45
    add(f3_tool45.part, mode=Mode.SUBTRACT)


with BuildPart() as f3_tool51:
    # F3_s52 → F3_t53 (new body)
    with BuildSketch(Plane(origin=(-15.7651840208, 0, -11.6722754965), x_dir=(0, 1, 0), z_dir=(0.8036946592, 0, 0.5950419269))):
        Polygon((0, -13.0738931843), (-3, -16.0738931843), (0, -16.0738931843), align=None)
    extrude(amount=F3_T53_DEPTH)

    split(bisect_by=Plane(origin=(-0.7127680041, 0, -0.9627016388), x_dir=(0, 1, 0), z_dir=(0.5950419269, 0, 0.8036946592)), keep=Keep.TOP)


with BuildPart() as f3_tool55:
    # F3_s56 → F3_t57 (new body)
    with BuildSketch(Plane(origin=(7.0122243563, 0, -5.1917322641), x_dir=(0, 1, 0), z_dir=(0.8036946592, 0, -0.5950419269))):
        Polygon((0, 1.8021549879), (-3, -1.1978450121), (0, -1.1978450121), align=None)
    extrude(amount=F3_T57_DEPTH)

    split(bisect_by=Plane(origin=(9.5646403729, 0, -12.918502105), x_dir=(0, 1, 0), z_dir=(-0.5950419269, 0, 0.8036946592)), keep=Keep.TOP)


with BuildPart() as f3_tool51_1:
    add(f3_tool51.part)

    # F3_t59: intersect F3_tool55
    add(f3_tool55.part, mode=Mode.INTERSECT)


with BuildPart() as f1_21:
    add(f1_20.part)

    # F3_t49: cut F3_tool51
    add(f3_tool51_1.part, mode=Mode.SUBTRACT)


with BuildPart() as f3_tool62:
    # F3_s63 → F3_t64 (new body)
    with BuildSketch(Plane(origin=(-31.913311652, 0, -23.6280759627), x_dir=(0, 1, 0), z_dir=(0.8036946592, 0, 0.5950419269))):
        Polygon((0, 1.8021549879), (-3, -1.1978450121), (0, -1.1978450121), align=None)
    extrude(amount=F3_T64_DEPTH)

    split(bisect_by=Plane(origin=(-9.5646403729, 0, -12.918502105), x_dir=(0, 1, 0), z_dir=(0.5950419269, 0, 0.8036946592)), keep=Keep.TOP)


with BuildPart() as f3_tool66:
    # F3_s67 → F3_t68 (new body)
    with BuildSketch(Plane(origin=(-9.1359032749, 0, 6.7640682021), x_dir=(0, 1, 0), z_dir=(0.8036946592, 0, -0.5950419269))):
        Polygon((0, -13.0738931843), (-3, -16.0738931843), (0, -16.0738931843), align=None)
    extrude(amount=F3_T68_DEPTH)

    split(bisect_by=Plane(origin=(0.7127680041, 0, -0.9627016388), x_dir=(0, 1, 0), z_dir=(-0.5950419269, 0, 0.8036946592)), keep=Keep.TOP)


with BuildPart() as f3_tool62_1:
    add(f3_tool62.part)

    # F3_t70: intersect F3_tool66
    add(f3_tool66.part, mode=Mode.INTERSECT)


with BuildPart() as f1_22:
    add(f1_21.part)

    # F3_t60: cut F3_tool62
    add(f3_tool62_1.part, mode=Mode.SUBTRACT)


with BuildPart() as f3_tool73:
    # F3_s74 → F3_t75 (new body)
    with BuildSketch(Plane(origin=(15.7651840208, 0, 11.6722754965), x_dir=(0, 1, 0), z_dir=(-0.8036946592, 0, -0.5950419269))):
        Polygon((0, -13.0738931843), (-3, -16.0738931843), (0, -16.0738931843), align=None)
    extrude(amount=F3_T75_DEPTH)

    split(bisect_by=Plane(origin=(0.7127680041, 0, 0.9627016388), x_dir=(0, 1, 0), z_dir=(-0.5950419269, 0, -0.8036946592)), keep=Keep.TOP)


with BuildPart() as f3_tool77:
    # F3_s78 → F3_t79 (new body)
    with BuildSketch(Plane(origin=(-7.0122243563, 0, 5.1917322641), x_dir=(0, 1, 0), z_dir=(-0.8036946592, 0, 0.5950419269))):
        Polygon((0, 1.8021549879), (-3, -1.1978450121), (0, -1.1978450121), align=None)
    extrude(amount=F3_T79_DEPTH)

    split(bisect_by=Plane(origin=(-9.5646403729, 0, 12.918502105), x_dir=(0, 1, 0), z_dir=(0.5950419269, 0, -0.8036946592)), keep=Keep.TOP)


with BuildPart() as f3_tool73_1:
    add(f3_tool73.part)

    # F3_t81: intersect F3_tool77
    add(f3_tool77.part, mode=Mode.INTERSECT)


with BuildPart() as f1_23:
    add(f1_22.part)

    # F3_t71: cut F3_tool73
    add(f3_tool73_1.part, mode=Mode.SUBTRACT)


with BuildPart() as f3_tool84:
    # F3_s85 → F3_t86 (new body)
    with BuildSketch(Plane(origin=(31.913311652, 0, 23.6280759627), x_dir=(0, 1, 0), z_dir=(-0.8036946592, 0, -0.5950419269))):
        Polygon((0, 1.8021549879), (-3, -1.1978450121), (0, -1.1978450121), align=None)
    extrude(amount=F3_T86_DEPTH)

    split(bisect_by=Plane(origin=(9.5646403729, 0, 12.918502105), x_dir=(0, 1, 0), z_dir=(-0.5950419269, 0, -0.8036946592)), keep=Keep.TOP)


with BuildPart() as f3_tool88:
    # F3_s89 → F3_t90 (new body)
    with BuildSketch(Plane(origin=(9.1359032749, 0, -6.7640682021), x_dir=(0, 1, 0), z_dir=(-0.8036946592, 0, 0.5950419269))):
        Polygon((0, -13.0738931843), (-3, -16.0738931843), (0, -16.0738931843), align=None)
    extrude(amount=F3_T90_DEPTH)

    split(bisect_by=Plane(origin=(-0.7127680041, 0, 0.9627016388), x_dir=(0, 1, 0), z_dir=(0.5950419269, 0, -0.8036946592)), keep=Keep.TOP)


with BuildPart() as f3_tool84_1:
    add(f3_tool84.part)

    # F3_t92: intersect F3_tool88
    add(f3_tool88.part, mode=Mode.INTERSECT)


with BuildPart() as f1_24:
    add(f1_23.part)

    # F3_t82: cut F3_tool84
    add(f3_tool84_1.part, mode=Mode.SUBTRACT)


solid = f1_24.part
